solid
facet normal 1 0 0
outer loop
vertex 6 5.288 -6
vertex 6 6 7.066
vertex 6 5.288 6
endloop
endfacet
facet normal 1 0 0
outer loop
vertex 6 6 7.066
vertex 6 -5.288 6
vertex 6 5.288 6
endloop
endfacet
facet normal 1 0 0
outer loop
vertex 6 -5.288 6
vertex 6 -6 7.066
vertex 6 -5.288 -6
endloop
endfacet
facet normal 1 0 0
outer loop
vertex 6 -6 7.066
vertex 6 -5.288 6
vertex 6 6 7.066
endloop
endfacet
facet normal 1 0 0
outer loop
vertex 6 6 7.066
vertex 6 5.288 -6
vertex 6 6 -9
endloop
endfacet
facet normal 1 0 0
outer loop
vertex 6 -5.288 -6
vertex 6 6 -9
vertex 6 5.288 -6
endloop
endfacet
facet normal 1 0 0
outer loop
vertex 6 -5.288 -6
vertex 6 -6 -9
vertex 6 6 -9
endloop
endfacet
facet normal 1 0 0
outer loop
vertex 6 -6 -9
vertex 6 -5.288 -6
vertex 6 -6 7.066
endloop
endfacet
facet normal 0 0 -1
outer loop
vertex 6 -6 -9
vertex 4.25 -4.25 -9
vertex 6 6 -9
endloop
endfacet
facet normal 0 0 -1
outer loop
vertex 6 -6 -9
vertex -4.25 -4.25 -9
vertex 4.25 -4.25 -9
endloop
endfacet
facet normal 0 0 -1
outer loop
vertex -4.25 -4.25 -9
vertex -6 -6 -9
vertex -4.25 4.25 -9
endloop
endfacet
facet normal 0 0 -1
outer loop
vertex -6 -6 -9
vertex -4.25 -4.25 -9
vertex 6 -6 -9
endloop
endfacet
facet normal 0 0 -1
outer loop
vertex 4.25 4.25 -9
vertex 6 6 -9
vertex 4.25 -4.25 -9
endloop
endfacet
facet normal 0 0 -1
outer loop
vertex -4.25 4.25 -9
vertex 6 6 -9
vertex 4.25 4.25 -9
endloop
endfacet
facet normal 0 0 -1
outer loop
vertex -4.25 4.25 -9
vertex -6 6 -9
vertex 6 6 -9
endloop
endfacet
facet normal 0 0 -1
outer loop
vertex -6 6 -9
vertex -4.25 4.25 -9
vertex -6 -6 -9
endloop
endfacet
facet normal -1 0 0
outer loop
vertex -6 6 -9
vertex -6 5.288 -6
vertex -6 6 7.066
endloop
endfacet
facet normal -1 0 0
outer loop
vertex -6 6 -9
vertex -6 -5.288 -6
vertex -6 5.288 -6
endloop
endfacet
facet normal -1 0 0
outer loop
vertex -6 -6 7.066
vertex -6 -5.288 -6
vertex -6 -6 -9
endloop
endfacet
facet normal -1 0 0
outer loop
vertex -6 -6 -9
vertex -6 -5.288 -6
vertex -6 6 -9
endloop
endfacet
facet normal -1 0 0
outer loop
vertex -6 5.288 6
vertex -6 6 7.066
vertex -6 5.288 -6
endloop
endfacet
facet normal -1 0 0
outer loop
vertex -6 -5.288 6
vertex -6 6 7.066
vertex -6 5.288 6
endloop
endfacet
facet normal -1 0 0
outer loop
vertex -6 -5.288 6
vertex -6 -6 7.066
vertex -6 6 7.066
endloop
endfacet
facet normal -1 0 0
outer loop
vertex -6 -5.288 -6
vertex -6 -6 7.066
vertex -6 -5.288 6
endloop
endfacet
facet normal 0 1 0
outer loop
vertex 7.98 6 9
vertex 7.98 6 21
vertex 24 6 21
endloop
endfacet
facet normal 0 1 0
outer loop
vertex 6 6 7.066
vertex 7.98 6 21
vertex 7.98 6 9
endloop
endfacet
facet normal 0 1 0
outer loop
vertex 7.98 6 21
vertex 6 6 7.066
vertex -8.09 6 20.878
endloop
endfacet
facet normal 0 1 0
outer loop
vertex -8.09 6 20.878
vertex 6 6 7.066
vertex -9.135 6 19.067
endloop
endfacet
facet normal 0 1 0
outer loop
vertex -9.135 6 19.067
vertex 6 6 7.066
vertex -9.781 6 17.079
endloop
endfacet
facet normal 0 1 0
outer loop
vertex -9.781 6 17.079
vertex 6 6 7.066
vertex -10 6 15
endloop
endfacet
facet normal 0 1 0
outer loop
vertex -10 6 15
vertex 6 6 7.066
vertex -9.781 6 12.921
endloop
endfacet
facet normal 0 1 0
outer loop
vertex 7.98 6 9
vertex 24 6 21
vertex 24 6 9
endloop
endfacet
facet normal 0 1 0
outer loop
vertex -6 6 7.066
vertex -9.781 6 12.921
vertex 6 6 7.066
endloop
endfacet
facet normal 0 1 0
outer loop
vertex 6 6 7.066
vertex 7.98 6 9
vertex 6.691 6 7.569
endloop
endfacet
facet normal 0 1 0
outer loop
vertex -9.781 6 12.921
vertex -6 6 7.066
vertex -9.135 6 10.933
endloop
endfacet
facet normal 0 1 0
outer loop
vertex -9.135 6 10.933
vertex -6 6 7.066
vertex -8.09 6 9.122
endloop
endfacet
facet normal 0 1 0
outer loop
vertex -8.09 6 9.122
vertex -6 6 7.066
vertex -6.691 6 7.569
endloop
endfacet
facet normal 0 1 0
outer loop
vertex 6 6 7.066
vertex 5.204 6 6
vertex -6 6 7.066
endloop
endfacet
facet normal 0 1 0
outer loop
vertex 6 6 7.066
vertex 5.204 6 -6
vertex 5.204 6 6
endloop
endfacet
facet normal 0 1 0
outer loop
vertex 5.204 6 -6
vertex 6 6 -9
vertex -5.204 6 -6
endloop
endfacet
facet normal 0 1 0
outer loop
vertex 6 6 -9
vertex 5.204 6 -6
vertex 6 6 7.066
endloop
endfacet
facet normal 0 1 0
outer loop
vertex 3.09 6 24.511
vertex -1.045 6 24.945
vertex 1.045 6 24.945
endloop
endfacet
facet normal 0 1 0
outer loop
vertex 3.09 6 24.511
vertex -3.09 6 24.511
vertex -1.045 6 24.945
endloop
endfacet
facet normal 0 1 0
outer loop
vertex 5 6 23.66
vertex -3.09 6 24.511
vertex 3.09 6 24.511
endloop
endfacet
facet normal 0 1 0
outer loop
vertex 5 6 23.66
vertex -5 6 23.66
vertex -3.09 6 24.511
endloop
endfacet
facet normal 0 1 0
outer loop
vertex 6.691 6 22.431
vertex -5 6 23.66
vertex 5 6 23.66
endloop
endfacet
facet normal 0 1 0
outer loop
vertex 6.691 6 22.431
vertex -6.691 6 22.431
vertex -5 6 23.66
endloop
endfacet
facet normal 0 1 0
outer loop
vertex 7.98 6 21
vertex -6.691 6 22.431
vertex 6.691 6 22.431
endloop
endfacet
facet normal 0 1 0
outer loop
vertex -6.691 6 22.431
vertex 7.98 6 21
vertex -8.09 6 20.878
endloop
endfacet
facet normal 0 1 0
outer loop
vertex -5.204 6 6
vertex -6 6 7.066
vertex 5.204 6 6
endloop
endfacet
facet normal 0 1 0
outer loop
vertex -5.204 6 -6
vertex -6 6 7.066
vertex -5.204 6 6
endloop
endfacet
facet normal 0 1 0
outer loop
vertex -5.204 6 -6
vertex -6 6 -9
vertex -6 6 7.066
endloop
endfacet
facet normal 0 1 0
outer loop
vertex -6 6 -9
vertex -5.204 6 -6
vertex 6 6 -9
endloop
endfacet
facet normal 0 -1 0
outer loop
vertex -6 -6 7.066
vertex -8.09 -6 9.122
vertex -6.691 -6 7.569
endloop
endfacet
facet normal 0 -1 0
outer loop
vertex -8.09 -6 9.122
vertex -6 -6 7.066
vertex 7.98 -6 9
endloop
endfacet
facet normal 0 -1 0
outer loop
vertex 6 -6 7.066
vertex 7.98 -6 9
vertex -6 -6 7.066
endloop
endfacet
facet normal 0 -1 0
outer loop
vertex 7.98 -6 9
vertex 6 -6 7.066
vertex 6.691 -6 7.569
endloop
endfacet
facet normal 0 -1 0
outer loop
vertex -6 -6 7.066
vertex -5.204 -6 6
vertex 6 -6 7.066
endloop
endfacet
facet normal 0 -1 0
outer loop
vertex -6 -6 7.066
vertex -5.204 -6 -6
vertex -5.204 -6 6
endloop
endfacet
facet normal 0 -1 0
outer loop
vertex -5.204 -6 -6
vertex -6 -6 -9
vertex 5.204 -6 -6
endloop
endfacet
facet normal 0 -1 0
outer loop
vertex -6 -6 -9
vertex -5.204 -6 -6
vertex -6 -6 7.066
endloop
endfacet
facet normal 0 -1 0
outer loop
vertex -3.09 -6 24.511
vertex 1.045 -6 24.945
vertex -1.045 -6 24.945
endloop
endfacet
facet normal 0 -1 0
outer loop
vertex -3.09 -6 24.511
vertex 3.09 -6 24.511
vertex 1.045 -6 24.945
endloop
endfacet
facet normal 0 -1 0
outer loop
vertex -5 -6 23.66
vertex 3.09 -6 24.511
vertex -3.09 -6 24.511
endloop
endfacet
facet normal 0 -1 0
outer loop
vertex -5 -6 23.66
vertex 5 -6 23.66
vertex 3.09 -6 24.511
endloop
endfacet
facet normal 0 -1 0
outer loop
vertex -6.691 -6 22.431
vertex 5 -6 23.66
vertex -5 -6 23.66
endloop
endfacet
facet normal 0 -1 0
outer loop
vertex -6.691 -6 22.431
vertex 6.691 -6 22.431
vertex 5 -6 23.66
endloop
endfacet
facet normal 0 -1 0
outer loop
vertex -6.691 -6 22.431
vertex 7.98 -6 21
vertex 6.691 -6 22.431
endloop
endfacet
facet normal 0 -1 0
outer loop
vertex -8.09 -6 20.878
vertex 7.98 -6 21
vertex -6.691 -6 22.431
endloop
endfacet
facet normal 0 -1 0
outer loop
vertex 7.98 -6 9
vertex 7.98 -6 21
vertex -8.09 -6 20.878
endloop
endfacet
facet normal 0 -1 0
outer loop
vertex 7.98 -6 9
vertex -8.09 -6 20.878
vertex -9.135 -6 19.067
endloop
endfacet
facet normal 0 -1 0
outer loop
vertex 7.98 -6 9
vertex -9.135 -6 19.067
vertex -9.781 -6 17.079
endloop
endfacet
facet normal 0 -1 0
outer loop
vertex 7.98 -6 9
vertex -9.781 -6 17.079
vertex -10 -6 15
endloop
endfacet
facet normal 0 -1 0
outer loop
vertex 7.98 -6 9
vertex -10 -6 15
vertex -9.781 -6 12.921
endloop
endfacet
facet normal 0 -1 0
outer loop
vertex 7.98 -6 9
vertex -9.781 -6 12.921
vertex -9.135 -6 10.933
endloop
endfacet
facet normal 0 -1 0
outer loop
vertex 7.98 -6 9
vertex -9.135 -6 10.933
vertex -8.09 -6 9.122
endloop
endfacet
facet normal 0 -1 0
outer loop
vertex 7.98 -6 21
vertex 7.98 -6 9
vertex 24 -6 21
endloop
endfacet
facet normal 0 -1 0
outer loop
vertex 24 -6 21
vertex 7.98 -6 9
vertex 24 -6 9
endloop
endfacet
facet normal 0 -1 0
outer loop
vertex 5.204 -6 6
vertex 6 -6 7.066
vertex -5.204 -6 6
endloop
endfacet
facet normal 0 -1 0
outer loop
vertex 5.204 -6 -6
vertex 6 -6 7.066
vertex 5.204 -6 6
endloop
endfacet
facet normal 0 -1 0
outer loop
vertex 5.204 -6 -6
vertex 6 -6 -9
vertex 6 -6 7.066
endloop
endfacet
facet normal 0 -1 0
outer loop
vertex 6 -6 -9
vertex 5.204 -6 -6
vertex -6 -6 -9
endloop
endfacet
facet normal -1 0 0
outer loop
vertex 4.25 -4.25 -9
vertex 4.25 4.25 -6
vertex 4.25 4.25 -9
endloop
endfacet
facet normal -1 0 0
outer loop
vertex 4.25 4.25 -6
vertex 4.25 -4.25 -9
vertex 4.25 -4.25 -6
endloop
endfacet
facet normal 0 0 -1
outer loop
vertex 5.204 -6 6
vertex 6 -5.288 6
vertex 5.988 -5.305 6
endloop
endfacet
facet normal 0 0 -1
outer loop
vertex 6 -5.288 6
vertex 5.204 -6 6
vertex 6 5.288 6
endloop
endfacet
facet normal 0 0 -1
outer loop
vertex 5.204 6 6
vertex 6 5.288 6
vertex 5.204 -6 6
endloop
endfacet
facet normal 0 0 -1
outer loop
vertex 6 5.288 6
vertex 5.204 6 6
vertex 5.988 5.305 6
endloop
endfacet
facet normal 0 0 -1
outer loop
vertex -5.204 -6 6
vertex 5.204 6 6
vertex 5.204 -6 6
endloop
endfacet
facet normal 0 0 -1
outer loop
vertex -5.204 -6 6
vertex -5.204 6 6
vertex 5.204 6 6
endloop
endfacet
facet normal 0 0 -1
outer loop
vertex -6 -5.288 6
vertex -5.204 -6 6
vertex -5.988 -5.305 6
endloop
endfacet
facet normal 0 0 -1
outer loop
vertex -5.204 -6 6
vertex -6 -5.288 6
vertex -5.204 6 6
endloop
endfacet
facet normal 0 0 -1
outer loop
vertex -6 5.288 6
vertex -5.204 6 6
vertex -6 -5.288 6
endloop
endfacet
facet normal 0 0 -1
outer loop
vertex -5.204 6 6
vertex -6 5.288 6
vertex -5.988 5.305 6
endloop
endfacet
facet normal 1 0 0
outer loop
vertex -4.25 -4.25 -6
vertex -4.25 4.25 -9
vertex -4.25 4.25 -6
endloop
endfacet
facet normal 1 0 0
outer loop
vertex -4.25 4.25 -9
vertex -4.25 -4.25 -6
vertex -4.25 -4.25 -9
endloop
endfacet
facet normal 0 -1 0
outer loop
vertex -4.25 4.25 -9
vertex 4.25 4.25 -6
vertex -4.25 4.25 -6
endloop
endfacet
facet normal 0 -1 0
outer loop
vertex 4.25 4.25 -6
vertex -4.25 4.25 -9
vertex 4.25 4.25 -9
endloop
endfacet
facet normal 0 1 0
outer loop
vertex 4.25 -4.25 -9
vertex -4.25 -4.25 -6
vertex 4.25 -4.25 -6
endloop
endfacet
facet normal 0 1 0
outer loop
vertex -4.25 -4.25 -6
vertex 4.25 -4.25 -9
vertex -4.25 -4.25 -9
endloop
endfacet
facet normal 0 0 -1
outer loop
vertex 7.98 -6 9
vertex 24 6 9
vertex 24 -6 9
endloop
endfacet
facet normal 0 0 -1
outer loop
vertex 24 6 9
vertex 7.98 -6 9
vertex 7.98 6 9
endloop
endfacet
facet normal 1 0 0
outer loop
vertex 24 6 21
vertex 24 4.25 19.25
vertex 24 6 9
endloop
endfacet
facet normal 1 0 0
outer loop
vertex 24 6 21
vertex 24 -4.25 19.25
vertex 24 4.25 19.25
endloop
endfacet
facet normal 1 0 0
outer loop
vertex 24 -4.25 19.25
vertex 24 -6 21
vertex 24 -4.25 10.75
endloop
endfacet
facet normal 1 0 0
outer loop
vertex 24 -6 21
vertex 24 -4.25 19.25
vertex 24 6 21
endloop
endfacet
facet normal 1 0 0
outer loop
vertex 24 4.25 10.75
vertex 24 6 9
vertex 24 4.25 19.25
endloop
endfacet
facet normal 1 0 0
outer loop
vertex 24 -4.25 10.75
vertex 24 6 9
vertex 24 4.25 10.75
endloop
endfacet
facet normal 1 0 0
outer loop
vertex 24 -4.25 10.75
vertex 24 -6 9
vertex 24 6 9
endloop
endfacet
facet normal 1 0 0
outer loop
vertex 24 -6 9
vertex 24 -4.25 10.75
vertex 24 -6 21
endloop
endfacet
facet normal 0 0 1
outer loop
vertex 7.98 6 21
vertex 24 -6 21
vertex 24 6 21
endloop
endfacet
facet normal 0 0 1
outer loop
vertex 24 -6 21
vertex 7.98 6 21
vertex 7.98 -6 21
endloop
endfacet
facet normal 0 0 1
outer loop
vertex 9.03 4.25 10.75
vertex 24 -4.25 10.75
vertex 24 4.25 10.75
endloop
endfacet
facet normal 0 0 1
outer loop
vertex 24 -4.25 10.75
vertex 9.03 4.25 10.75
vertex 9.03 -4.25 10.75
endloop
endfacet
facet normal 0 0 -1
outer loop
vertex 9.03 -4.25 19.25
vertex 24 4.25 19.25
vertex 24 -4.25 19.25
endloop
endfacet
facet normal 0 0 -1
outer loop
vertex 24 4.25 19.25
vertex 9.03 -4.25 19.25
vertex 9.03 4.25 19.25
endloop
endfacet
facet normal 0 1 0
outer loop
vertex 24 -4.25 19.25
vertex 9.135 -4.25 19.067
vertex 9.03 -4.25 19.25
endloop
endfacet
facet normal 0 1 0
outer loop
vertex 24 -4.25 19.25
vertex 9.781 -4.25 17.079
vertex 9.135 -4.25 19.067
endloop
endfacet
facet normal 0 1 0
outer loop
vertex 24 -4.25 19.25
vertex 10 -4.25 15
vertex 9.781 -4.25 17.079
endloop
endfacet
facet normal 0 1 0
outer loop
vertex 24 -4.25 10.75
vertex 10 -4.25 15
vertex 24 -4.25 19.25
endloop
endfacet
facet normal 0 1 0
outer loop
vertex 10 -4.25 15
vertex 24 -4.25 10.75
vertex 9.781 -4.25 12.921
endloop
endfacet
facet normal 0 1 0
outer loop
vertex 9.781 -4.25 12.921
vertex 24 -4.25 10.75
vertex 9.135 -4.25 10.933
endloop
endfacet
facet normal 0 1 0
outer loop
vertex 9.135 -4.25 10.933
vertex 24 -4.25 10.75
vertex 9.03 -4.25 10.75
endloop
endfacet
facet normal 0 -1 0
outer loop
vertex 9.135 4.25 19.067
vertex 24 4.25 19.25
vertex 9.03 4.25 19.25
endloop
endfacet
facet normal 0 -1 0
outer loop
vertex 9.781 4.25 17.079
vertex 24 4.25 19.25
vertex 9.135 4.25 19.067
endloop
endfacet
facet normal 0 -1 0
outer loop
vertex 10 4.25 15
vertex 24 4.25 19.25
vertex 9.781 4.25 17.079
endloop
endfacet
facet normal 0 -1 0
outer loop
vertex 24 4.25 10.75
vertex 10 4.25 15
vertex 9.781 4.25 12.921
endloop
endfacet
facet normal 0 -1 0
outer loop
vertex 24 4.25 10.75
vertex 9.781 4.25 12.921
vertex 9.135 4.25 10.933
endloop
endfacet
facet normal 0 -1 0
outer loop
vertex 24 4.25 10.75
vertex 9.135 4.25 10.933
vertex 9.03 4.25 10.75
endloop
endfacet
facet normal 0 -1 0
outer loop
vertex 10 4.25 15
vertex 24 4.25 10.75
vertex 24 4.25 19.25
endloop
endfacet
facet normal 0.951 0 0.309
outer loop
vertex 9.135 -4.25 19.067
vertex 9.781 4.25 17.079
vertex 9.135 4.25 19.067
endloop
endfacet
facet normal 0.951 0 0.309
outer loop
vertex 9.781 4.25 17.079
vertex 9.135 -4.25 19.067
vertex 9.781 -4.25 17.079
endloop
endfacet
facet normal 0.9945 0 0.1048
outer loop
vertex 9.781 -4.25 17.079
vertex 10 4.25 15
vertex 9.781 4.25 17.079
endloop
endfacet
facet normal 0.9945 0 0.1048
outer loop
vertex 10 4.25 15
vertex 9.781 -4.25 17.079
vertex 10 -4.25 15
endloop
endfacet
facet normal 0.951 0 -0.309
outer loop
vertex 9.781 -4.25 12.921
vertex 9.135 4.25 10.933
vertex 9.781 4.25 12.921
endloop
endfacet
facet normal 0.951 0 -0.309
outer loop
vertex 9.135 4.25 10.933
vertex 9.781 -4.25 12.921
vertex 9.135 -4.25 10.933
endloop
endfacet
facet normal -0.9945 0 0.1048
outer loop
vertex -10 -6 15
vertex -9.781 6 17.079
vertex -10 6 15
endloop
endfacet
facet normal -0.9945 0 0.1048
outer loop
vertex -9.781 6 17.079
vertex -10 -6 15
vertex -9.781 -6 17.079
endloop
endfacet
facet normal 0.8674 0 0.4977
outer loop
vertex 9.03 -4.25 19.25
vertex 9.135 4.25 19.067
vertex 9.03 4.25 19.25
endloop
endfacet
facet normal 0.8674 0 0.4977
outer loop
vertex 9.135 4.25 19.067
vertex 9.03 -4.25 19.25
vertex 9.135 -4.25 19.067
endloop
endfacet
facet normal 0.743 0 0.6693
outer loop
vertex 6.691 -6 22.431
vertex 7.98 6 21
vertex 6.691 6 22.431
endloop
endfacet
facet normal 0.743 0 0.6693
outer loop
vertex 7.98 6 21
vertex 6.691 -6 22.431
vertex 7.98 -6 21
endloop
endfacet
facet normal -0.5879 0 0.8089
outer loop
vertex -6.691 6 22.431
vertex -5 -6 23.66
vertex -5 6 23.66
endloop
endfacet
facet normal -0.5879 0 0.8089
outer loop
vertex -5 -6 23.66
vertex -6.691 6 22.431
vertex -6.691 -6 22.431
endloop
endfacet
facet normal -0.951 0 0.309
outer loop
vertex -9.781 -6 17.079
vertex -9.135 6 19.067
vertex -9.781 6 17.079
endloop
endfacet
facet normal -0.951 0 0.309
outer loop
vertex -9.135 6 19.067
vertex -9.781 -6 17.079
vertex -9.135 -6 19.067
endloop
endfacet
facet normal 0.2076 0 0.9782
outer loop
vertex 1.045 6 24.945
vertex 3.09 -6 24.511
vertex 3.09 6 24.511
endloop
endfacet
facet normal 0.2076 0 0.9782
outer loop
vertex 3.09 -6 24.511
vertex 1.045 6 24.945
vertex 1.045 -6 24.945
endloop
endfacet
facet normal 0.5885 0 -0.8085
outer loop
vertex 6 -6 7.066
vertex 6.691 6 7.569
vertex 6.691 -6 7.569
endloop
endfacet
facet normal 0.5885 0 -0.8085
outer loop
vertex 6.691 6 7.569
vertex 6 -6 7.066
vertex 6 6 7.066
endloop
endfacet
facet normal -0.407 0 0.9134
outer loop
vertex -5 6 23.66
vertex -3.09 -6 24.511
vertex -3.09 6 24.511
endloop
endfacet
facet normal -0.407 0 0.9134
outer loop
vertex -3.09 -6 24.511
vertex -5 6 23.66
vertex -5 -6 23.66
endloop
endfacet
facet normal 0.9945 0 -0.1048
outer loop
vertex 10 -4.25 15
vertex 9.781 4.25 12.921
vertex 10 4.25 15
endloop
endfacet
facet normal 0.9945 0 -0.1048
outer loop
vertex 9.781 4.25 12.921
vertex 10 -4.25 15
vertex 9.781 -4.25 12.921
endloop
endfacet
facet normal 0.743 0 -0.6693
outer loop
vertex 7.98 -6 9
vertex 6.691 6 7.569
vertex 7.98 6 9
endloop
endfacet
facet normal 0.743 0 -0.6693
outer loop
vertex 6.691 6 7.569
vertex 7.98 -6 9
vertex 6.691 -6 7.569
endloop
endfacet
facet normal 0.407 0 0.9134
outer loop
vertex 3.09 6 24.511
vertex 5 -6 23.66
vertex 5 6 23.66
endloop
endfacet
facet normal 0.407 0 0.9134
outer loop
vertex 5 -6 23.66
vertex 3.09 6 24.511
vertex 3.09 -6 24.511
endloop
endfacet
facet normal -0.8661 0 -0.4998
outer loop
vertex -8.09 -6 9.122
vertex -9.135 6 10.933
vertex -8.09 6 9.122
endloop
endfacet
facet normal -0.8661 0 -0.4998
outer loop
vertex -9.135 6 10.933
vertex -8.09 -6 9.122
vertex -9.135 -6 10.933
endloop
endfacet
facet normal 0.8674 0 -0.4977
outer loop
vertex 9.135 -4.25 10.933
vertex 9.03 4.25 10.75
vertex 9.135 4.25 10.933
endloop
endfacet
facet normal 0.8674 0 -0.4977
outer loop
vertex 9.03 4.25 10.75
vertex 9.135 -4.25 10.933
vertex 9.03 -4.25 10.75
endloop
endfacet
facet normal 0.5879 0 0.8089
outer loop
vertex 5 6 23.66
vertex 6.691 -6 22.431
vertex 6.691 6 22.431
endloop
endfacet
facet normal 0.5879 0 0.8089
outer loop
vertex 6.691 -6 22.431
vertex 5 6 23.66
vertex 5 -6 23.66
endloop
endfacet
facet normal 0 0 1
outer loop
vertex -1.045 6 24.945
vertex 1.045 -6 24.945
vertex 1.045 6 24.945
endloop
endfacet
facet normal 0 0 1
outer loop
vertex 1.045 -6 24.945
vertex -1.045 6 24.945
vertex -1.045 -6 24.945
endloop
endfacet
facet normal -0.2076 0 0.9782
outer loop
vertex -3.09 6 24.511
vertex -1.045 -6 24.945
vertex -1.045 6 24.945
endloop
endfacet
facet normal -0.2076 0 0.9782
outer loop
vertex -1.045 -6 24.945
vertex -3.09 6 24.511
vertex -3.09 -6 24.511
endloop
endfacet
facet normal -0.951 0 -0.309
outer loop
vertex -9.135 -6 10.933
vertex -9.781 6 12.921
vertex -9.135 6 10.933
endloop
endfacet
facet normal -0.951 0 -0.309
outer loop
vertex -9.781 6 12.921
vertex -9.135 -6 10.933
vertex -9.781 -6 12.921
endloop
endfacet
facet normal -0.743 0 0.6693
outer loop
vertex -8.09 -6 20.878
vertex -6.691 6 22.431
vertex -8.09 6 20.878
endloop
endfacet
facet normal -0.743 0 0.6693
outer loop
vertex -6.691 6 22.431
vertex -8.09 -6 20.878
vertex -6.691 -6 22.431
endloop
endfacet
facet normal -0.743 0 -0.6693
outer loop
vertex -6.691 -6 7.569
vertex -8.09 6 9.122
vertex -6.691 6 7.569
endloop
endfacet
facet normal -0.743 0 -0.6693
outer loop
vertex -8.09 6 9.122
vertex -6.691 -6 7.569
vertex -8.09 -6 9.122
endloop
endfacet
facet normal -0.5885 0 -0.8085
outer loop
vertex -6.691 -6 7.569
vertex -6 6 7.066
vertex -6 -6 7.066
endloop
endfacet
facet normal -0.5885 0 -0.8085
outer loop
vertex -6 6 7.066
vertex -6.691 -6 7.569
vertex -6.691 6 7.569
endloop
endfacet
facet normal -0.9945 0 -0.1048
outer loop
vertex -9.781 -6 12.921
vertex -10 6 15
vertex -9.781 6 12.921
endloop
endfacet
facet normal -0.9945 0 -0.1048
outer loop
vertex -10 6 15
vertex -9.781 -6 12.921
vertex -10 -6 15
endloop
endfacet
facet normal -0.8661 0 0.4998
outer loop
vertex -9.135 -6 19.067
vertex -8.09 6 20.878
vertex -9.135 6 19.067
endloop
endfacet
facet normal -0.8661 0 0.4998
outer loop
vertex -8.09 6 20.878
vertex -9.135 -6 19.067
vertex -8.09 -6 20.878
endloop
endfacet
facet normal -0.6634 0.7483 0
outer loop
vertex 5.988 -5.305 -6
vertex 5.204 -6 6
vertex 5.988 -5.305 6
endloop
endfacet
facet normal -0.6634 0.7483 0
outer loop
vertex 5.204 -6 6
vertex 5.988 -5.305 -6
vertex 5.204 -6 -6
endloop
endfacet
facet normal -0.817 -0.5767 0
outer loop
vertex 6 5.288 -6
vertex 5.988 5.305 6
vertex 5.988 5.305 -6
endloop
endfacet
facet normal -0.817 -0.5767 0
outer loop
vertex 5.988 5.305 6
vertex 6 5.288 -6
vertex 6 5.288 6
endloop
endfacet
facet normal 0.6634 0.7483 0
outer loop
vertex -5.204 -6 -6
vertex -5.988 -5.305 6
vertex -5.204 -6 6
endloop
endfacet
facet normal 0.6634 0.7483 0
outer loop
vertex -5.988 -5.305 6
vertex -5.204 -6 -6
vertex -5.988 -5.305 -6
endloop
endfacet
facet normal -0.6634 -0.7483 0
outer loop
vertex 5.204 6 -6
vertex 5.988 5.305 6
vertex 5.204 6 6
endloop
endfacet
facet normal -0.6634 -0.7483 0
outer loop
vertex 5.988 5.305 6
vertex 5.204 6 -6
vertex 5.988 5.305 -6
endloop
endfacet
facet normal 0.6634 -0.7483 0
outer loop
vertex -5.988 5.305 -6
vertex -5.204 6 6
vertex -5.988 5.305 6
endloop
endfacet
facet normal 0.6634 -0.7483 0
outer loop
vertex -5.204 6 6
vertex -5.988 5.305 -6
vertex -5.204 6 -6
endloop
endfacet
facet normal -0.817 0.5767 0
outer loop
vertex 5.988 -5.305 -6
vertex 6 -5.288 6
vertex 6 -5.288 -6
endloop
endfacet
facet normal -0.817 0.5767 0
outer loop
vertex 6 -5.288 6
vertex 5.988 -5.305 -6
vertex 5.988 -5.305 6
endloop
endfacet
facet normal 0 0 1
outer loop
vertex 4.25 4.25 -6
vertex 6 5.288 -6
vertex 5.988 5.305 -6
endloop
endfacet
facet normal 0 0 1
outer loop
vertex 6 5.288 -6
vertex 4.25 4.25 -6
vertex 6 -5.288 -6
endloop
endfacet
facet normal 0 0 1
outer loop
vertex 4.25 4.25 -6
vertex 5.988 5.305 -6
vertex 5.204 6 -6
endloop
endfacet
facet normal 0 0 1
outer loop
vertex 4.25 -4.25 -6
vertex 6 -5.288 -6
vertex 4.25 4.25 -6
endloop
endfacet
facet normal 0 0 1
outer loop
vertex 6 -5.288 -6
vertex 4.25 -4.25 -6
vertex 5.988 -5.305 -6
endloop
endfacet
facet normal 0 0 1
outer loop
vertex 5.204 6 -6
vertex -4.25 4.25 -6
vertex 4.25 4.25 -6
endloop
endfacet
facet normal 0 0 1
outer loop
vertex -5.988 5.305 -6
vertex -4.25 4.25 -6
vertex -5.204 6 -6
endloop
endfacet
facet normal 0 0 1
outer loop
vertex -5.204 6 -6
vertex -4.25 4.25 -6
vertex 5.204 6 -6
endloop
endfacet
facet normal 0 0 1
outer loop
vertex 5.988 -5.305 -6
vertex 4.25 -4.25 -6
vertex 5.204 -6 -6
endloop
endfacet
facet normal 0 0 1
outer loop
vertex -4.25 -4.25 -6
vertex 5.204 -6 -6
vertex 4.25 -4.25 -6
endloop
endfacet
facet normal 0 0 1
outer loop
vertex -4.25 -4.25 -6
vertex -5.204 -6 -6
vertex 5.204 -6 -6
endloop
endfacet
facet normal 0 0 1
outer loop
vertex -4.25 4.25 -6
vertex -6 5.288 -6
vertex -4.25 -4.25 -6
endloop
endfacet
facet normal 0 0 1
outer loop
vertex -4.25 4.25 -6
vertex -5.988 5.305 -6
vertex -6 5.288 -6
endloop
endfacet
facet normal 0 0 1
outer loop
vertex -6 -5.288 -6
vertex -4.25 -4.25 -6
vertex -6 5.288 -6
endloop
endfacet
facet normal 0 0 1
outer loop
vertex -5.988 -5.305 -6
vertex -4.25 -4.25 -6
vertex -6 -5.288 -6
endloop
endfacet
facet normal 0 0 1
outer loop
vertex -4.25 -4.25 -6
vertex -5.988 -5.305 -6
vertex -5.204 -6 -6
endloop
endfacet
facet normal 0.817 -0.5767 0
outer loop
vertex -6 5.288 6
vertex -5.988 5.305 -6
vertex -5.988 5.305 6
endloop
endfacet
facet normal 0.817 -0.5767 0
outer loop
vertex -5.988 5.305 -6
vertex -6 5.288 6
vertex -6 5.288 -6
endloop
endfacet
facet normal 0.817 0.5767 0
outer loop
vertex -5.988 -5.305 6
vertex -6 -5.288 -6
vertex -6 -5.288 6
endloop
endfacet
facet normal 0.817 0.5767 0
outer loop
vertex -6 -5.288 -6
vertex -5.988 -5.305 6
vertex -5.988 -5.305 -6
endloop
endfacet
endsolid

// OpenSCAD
difference() {
    union() {
        translate([0, 0, 15]) rotate([90, 0, 0])  cylinder(d=20, h=12, center=true);
        leg();
        translate([15, 0, 15]) rotate([180, 90, 0]) leg();
    }
    cylinder(d=16, h=12, center=true);
}

module leg() {
    difference() { 
        cube([12, 12, 18], center=true);
        translate([0, 0, -2]) cube([8.5, 8.5, 16], center=true);
    }
}
